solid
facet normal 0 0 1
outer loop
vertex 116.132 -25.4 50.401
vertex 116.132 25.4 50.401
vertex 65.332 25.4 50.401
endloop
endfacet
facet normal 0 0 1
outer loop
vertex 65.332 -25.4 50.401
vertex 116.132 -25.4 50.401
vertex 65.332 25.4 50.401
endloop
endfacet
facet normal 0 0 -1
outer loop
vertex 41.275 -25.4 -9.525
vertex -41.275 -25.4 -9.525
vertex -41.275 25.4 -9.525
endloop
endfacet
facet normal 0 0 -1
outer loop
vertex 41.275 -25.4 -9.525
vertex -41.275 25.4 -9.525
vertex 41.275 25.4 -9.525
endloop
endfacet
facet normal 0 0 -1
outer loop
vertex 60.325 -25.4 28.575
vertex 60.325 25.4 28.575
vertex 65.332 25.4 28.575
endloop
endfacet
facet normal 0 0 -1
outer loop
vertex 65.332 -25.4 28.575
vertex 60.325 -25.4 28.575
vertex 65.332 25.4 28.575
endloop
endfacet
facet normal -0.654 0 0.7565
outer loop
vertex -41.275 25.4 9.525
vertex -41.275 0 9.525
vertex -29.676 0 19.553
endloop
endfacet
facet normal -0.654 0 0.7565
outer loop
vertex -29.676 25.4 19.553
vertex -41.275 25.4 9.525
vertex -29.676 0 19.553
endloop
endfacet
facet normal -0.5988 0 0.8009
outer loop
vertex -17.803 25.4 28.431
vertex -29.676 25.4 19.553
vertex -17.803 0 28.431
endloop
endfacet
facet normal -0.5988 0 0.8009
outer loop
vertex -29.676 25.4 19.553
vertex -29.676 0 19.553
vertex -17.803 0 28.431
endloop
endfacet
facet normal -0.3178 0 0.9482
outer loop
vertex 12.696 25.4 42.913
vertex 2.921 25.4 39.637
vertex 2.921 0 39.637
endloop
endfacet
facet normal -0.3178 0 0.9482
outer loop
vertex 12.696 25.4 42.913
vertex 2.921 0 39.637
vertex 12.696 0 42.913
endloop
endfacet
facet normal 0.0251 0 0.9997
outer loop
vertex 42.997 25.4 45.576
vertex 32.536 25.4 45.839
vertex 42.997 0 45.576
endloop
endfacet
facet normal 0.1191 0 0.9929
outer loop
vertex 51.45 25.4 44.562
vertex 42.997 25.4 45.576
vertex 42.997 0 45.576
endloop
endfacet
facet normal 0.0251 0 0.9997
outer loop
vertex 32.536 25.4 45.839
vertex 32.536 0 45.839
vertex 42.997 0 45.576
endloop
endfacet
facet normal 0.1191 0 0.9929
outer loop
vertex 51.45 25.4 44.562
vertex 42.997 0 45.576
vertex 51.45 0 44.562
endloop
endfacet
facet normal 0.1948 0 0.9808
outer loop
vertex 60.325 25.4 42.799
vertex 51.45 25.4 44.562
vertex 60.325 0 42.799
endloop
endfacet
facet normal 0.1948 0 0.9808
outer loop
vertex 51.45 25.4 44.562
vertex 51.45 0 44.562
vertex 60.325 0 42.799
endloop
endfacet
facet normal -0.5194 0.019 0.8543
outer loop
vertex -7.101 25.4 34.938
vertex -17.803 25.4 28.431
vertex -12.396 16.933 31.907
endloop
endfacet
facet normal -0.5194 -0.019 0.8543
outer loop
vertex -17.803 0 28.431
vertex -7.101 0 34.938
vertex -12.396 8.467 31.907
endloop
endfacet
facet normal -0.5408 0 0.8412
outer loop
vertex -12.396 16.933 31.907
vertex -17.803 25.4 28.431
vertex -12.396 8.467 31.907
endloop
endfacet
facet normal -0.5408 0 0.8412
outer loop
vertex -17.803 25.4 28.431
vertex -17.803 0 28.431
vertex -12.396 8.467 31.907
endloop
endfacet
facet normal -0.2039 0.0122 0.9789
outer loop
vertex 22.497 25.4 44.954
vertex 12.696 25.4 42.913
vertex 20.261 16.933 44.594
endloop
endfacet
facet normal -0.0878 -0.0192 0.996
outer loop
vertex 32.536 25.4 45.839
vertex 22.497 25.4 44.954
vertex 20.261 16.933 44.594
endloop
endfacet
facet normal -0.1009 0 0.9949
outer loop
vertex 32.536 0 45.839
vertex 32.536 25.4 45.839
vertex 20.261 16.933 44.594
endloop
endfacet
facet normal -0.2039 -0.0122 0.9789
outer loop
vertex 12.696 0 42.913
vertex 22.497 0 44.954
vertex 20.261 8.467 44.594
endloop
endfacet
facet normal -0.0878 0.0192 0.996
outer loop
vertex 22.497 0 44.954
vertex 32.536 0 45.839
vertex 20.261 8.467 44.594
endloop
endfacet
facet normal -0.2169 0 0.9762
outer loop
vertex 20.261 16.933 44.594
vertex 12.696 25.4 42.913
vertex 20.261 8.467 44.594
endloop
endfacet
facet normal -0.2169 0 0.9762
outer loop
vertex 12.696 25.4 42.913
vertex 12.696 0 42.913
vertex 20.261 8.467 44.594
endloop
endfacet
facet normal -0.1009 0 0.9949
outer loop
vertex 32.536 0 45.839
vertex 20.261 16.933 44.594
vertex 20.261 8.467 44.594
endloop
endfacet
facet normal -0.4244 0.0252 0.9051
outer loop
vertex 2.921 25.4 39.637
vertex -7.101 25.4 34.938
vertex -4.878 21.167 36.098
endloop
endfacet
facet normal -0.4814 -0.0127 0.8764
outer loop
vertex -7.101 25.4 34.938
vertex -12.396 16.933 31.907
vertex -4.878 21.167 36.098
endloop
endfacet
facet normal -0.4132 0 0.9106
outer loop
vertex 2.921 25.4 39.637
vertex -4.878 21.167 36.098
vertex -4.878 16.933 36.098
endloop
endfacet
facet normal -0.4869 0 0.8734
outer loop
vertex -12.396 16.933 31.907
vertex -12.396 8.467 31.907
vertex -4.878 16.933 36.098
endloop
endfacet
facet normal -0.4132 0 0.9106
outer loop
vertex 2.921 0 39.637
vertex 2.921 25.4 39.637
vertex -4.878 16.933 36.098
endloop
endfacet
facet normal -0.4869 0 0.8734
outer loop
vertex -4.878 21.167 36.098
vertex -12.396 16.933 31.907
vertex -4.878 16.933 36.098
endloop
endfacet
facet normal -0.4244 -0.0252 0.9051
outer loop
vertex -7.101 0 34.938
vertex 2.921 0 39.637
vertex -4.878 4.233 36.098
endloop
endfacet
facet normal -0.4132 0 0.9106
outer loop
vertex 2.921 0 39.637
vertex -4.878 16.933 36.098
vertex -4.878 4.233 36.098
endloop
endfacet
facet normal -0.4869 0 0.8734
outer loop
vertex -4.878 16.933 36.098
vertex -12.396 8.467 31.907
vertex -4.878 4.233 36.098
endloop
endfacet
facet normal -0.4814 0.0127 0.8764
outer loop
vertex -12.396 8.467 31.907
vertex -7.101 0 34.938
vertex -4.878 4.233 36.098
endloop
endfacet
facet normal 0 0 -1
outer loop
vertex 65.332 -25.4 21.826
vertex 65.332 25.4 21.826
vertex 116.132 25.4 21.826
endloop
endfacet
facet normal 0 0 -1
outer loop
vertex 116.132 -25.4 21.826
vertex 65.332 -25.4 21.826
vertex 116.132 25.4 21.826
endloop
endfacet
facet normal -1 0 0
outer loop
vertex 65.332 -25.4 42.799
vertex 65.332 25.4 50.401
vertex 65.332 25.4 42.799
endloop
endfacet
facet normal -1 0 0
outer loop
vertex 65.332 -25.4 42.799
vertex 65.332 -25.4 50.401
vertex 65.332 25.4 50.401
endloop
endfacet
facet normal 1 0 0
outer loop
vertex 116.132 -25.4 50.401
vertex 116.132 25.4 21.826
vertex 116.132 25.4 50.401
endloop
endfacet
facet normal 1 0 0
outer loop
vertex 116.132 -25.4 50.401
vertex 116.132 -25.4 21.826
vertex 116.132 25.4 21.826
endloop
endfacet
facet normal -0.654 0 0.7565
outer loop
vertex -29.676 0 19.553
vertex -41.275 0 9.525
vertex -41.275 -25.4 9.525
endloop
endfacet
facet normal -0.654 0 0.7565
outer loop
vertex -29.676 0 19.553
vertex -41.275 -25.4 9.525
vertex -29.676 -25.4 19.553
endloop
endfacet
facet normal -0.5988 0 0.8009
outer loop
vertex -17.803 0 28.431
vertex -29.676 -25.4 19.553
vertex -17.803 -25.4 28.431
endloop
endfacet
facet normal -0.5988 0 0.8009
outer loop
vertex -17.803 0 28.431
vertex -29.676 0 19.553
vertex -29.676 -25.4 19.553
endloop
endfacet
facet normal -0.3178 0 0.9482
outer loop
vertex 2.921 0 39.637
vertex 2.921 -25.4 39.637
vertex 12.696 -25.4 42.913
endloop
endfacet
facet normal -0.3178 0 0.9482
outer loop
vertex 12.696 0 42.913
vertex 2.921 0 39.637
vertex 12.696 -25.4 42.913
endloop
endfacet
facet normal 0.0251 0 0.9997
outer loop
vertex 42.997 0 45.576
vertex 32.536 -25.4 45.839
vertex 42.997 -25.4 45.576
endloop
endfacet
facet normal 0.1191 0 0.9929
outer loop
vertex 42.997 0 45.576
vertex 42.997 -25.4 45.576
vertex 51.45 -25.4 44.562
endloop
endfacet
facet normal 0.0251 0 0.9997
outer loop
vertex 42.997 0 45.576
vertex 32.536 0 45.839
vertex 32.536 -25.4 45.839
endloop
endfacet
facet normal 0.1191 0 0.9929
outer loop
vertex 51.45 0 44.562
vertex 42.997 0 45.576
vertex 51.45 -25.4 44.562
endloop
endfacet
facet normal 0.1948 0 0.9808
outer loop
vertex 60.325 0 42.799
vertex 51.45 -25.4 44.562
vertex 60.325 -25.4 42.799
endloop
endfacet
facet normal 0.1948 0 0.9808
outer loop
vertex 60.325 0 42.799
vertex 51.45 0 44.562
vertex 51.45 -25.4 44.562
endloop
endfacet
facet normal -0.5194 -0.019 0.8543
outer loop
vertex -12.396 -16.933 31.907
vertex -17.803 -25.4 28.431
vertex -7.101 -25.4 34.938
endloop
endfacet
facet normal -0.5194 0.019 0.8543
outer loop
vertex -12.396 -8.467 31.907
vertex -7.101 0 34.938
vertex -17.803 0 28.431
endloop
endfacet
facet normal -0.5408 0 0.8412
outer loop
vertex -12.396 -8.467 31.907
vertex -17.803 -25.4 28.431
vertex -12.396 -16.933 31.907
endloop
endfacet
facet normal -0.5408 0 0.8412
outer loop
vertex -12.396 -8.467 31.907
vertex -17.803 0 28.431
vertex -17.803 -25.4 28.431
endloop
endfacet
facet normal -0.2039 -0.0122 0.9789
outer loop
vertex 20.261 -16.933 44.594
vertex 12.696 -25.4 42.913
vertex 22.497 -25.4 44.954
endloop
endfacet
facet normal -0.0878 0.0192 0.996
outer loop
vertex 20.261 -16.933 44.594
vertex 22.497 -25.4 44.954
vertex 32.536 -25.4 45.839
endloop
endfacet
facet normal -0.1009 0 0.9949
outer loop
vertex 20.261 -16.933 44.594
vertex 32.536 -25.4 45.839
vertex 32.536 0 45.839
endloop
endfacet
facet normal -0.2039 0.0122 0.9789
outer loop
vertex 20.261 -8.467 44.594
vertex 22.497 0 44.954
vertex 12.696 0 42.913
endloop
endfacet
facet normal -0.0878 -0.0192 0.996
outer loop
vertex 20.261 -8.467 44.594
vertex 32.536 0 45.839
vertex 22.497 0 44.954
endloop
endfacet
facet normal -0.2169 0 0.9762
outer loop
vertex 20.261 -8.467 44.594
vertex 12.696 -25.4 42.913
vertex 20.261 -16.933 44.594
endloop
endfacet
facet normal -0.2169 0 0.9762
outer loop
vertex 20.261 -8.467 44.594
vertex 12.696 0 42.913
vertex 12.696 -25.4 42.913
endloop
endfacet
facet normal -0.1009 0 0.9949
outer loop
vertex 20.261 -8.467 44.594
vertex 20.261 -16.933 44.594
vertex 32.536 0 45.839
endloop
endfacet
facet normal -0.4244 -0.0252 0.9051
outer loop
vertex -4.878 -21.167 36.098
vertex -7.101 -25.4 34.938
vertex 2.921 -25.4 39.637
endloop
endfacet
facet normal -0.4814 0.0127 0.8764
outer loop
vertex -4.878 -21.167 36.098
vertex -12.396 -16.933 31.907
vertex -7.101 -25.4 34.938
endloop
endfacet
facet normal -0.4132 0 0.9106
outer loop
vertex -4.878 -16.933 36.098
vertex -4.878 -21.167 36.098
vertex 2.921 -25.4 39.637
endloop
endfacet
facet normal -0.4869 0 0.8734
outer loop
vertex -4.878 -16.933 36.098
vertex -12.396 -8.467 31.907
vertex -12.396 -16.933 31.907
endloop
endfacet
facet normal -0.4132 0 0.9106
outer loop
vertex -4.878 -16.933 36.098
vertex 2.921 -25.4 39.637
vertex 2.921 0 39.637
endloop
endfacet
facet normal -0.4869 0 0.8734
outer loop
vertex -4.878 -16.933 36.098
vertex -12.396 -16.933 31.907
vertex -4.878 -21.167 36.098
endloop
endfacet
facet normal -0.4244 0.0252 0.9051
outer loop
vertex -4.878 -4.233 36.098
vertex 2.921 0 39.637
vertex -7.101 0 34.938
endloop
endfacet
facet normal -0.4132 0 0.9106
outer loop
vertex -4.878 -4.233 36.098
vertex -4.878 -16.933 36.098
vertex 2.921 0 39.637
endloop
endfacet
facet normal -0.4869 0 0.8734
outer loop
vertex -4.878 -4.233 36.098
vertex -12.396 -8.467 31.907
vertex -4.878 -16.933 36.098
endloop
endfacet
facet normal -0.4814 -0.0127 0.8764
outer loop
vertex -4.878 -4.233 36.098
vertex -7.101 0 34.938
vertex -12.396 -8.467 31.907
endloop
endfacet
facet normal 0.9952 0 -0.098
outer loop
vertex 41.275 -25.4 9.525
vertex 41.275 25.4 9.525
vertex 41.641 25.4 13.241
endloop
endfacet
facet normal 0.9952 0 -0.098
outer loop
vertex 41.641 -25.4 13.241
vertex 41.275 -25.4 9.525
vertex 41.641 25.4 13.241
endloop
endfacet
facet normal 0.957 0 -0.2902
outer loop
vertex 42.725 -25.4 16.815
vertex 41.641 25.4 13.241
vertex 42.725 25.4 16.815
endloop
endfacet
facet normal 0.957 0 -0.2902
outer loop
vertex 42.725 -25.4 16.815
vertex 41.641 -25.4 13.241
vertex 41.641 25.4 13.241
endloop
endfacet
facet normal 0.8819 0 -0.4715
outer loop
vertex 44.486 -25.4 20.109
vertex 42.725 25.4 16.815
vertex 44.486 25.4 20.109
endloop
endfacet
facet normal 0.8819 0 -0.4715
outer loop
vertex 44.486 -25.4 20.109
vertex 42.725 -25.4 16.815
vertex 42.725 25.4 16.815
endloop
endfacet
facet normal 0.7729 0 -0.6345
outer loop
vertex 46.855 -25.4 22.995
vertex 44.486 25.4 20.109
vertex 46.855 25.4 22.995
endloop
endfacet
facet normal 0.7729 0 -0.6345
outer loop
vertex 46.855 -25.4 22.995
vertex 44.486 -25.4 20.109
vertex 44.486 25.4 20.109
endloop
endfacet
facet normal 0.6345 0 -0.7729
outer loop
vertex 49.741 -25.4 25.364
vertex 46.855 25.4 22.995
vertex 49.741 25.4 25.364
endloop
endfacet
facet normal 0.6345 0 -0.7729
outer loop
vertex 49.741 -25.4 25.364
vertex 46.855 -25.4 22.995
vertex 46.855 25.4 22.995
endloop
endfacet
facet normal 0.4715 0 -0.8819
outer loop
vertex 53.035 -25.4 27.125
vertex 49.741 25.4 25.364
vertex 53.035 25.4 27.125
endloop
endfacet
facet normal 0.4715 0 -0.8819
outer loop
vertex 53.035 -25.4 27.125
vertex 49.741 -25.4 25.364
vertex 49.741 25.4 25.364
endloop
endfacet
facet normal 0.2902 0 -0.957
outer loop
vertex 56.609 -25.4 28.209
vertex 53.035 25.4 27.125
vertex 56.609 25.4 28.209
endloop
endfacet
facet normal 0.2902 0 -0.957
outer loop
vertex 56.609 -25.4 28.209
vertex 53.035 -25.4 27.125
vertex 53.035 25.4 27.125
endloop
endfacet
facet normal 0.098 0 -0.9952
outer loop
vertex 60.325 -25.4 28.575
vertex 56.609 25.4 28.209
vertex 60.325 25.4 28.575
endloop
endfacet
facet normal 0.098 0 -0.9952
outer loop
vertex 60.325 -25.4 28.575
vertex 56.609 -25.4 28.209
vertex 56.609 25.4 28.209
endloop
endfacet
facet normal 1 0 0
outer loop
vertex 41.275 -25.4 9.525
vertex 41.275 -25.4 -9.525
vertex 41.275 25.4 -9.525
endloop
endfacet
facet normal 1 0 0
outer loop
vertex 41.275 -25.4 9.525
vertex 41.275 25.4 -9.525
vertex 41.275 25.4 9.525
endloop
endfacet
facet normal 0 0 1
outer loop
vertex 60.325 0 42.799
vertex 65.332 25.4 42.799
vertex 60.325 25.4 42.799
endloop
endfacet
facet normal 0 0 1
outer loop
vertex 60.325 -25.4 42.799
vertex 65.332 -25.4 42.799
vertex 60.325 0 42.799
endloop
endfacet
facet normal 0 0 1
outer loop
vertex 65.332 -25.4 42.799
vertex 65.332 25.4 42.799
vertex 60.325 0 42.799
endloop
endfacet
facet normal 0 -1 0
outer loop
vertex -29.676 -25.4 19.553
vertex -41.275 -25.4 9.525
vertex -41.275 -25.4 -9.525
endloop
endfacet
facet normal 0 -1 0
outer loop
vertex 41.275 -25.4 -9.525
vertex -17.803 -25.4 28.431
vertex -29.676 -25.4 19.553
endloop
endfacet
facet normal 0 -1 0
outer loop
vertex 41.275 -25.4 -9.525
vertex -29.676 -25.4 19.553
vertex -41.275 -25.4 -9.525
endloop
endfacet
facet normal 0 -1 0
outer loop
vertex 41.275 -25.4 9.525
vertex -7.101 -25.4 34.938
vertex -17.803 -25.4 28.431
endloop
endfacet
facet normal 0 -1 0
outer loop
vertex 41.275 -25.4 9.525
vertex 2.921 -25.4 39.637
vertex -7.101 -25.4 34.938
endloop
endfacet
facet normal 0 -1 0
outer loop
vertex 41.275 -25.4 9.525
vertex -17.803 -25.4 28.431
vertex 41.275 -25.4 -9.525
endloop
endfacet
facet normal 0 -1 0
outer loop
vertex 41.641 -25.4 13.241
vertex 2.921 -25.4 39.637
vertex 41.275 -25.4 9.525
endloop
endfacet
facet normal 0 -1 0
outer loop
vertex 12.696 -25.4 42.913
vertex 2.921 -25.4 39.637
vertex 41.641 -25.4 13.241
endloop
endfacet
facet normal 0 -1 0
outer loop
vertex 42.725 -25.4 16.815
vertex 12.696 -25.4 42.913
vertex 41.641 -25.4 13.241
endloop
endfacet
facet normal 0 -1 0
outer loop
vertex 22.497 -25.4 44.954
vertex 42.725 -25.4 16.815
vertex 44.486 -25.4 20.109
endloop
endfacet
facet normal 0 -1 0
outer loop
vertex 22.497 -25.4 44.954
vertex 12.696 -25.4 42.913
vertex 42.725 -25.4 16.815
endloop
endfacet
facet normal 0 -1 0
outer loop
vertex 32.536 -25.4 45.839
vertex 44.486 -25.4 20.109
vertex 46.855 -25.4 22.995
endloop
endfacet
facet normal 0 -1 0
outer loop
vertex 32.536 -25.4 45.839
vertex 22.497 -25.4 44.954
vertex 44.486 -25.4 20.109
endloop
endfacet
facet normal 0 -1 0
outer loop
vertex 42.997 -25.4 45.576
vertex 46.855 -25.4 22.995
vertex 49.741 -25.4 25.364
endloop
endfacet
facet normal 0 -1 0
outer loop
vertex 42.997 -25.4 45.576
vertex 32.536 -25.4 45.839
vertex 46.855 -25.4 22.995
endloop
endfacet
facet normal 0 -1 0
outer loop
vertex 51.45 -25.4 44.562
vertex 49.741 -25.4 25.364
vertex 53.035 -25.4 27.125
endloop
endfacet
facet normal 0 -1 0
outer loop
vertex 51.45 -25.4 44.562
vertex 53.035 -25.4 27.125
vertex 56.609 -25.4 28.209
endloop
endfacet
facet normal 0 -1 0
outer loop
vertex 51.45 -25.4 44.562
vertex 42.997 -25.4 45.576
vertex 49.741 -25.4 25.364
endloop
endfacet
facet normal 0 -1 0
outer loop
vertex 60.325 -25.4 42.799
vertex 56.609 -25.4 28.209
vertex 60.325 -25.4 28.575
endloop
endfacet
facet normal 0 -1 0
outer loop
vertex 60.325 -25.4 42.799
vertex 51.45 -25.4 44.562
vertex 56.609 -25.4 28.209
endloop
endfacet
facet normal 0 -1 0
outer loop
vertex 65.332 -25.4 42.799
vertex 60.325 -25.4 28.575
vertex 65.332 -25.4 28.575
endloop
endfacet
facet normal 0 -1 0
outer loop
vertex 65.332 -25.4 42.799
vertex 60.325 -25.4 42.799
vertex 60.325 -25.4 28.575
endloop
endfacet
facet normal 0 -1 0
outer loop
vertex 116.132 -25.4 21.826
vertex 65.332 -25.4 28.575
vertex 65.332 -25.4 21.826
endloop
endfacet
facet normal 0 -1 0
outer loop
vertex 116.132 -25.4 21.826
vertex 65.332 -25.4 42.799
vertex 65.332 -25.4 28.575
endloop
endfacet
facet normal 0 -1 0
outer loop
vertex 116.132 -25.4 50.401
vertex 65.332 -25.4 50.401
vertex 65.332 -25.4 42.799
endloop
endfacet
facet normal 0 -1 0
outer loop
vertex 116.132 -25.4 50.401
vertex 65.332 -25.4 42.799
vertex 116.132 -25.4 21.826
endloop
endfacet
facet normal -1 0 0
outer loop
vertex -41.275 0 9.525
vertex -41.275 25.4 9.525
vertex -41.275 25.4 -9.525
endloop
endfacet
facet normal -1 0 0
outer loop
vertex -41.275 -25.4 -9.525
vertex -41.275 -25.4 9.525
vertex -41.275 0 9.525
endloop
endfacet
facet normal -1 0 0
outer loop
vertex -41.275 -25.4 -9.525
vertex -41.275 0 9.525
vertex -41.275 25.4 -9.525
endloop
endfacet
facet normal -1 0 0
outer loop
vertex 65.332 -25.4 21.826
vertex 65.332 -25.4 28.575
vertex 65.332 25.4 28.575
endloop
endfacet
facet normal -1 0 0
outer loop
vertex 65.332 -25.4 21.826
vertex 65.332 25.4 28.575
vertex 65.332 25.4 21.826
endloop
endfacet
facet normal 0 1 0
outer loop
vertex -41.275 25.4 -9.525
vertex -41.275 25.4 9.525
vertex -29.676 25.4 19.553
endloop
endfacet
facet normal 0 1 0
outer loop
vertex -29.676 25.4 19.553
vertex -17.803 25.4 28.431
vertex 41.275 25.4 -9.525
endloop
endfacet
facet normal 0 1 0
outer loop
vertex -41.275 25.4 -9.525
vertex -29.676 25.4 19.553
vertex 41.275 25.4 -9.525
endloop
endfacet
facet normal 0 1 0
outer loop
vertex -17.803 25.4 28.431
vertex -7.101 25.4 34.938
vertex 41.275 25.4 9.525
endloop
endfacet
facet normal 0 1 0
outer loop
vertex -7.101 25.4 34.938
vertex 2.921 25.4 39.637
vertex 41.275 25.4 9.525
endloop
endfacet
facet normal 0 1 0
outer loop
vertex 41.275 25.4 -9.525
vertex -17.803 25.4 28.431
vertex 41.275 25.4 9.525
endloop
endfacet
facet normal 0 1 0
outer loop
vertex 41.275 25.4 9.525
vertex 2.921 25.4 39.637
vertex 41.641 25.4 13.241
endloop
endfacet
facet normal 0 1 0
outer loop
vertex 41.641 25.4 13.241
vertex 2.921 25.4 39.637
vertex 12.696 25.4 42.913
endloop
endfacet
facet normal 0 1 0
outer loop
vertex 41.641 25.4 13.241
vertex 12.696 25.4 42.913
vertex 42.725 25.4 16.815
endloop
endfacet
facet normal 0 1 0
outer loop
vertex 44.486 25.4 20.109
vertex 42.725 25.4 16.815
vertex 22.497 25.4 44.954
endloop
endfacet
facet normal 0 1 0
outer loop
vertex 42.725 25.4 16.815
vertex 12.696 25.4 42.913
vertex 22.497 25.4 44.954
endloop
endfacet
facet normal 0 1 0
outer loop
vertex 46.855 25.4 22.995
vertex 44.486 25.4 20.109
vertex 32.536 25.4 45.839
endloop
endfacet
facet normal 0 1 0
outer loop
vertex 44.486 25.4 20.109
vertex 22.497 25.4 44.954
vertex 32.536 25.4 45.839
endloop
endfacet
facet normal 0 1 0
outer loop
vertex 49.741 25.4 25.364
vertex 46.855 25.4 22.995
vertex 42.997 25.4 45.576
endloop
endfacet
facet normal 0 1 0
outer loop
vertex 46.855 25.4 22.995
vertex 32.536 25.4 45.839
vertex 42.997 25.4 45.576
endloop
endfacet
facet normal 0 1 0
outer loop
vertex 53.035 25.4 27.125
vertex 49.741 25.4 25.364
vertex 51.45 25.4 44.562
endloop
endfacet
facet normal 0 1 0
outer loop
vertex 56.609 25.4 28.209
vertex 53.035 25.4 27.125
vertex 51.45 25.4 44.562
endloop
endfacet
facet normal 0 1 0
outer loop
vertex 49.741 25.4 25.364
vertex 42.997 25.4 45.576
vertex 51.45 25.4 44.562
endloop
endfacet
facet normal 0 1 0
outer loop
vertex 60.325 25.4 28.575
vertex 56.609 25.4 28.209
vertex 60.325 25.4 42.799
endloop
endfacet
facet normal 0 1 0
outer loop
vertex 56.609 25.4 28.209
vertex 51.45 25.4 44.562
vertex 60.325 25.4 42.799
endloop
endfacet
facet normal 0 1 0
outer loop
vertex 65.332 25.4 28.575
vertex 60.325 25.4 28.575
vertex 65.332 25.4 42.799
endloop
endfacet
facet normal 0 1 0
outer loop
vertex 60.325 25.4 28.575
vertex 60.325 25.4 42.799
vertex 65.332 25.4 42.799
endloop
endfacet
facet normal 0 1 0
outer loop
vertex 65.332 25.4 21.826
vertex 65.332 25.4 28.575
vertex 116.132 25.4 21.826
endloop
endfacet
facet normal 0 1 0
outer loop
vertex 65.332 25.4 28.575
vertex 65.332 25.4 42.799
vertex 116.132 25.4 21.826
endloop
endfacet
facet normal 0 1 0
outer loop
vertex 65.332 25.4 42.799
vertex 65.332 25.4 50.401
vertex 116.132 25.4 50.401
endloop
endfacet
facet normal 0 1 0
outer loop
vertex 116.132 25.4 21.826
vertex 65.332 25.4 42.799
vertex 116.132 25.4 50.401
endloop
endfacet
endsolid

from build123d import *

# Parameters (mm, degrees)
F1_DEPTH = 25.4


with BuildPart() as f1:
    # F0 (on Front) → F1 (new body, symmetric)
    with BuildSketch(Plane.XZ):
        Polygon((65.332091, 50.400867), (65.332091, 42.799), (65.332091, 28.575), (65.332091, 21.825867), (116.132091, 21.825867), (116.132091, 50.400867), align=None)
        with BuildLine():
            ThreePointArc((60.325, 42.799), (36.796729, 33.053271), (27.051, 9.525))
            Line((27.051, 9.525), (41.275, 9.525))
            ThreePointArc((41.275, 9.525), (46.854616, 22.995384), (60.325, 28.575))
            Line((60.325, 28.575), (65.332091, 28.575))
            Line((65.332091, 28.575), (65.332091, 42.799))
            Line((65.332091, 42.799), (60.325, 42.799))
        make_face()
        Polygon((27.051, 9.525), (-41.275, 9.525), (-41.275, -9.525), (41.275, -9.525), (41.275, 9.525), align=None)
        with BuildLine():
            add(Edge.make_bspline(
                [(-41.275, 9.525), (-13.07586, 35.157815), (15.348731, 53.430766), (60.325, 42.799)],
                knots=[0, 0, 0, 0, 106.909864, 106.909864, 106.909864, 106.909864], degree=3))
            Line((-41.275, 9.525), (27.051, 9.525))
            ThreePointArc((27.051, 9.525), (36.796729, 33.053271), (60.325, 42.799))
        make_face()
    extrude(amount=F1_DEPTH, both=True)


solid = f1.part
